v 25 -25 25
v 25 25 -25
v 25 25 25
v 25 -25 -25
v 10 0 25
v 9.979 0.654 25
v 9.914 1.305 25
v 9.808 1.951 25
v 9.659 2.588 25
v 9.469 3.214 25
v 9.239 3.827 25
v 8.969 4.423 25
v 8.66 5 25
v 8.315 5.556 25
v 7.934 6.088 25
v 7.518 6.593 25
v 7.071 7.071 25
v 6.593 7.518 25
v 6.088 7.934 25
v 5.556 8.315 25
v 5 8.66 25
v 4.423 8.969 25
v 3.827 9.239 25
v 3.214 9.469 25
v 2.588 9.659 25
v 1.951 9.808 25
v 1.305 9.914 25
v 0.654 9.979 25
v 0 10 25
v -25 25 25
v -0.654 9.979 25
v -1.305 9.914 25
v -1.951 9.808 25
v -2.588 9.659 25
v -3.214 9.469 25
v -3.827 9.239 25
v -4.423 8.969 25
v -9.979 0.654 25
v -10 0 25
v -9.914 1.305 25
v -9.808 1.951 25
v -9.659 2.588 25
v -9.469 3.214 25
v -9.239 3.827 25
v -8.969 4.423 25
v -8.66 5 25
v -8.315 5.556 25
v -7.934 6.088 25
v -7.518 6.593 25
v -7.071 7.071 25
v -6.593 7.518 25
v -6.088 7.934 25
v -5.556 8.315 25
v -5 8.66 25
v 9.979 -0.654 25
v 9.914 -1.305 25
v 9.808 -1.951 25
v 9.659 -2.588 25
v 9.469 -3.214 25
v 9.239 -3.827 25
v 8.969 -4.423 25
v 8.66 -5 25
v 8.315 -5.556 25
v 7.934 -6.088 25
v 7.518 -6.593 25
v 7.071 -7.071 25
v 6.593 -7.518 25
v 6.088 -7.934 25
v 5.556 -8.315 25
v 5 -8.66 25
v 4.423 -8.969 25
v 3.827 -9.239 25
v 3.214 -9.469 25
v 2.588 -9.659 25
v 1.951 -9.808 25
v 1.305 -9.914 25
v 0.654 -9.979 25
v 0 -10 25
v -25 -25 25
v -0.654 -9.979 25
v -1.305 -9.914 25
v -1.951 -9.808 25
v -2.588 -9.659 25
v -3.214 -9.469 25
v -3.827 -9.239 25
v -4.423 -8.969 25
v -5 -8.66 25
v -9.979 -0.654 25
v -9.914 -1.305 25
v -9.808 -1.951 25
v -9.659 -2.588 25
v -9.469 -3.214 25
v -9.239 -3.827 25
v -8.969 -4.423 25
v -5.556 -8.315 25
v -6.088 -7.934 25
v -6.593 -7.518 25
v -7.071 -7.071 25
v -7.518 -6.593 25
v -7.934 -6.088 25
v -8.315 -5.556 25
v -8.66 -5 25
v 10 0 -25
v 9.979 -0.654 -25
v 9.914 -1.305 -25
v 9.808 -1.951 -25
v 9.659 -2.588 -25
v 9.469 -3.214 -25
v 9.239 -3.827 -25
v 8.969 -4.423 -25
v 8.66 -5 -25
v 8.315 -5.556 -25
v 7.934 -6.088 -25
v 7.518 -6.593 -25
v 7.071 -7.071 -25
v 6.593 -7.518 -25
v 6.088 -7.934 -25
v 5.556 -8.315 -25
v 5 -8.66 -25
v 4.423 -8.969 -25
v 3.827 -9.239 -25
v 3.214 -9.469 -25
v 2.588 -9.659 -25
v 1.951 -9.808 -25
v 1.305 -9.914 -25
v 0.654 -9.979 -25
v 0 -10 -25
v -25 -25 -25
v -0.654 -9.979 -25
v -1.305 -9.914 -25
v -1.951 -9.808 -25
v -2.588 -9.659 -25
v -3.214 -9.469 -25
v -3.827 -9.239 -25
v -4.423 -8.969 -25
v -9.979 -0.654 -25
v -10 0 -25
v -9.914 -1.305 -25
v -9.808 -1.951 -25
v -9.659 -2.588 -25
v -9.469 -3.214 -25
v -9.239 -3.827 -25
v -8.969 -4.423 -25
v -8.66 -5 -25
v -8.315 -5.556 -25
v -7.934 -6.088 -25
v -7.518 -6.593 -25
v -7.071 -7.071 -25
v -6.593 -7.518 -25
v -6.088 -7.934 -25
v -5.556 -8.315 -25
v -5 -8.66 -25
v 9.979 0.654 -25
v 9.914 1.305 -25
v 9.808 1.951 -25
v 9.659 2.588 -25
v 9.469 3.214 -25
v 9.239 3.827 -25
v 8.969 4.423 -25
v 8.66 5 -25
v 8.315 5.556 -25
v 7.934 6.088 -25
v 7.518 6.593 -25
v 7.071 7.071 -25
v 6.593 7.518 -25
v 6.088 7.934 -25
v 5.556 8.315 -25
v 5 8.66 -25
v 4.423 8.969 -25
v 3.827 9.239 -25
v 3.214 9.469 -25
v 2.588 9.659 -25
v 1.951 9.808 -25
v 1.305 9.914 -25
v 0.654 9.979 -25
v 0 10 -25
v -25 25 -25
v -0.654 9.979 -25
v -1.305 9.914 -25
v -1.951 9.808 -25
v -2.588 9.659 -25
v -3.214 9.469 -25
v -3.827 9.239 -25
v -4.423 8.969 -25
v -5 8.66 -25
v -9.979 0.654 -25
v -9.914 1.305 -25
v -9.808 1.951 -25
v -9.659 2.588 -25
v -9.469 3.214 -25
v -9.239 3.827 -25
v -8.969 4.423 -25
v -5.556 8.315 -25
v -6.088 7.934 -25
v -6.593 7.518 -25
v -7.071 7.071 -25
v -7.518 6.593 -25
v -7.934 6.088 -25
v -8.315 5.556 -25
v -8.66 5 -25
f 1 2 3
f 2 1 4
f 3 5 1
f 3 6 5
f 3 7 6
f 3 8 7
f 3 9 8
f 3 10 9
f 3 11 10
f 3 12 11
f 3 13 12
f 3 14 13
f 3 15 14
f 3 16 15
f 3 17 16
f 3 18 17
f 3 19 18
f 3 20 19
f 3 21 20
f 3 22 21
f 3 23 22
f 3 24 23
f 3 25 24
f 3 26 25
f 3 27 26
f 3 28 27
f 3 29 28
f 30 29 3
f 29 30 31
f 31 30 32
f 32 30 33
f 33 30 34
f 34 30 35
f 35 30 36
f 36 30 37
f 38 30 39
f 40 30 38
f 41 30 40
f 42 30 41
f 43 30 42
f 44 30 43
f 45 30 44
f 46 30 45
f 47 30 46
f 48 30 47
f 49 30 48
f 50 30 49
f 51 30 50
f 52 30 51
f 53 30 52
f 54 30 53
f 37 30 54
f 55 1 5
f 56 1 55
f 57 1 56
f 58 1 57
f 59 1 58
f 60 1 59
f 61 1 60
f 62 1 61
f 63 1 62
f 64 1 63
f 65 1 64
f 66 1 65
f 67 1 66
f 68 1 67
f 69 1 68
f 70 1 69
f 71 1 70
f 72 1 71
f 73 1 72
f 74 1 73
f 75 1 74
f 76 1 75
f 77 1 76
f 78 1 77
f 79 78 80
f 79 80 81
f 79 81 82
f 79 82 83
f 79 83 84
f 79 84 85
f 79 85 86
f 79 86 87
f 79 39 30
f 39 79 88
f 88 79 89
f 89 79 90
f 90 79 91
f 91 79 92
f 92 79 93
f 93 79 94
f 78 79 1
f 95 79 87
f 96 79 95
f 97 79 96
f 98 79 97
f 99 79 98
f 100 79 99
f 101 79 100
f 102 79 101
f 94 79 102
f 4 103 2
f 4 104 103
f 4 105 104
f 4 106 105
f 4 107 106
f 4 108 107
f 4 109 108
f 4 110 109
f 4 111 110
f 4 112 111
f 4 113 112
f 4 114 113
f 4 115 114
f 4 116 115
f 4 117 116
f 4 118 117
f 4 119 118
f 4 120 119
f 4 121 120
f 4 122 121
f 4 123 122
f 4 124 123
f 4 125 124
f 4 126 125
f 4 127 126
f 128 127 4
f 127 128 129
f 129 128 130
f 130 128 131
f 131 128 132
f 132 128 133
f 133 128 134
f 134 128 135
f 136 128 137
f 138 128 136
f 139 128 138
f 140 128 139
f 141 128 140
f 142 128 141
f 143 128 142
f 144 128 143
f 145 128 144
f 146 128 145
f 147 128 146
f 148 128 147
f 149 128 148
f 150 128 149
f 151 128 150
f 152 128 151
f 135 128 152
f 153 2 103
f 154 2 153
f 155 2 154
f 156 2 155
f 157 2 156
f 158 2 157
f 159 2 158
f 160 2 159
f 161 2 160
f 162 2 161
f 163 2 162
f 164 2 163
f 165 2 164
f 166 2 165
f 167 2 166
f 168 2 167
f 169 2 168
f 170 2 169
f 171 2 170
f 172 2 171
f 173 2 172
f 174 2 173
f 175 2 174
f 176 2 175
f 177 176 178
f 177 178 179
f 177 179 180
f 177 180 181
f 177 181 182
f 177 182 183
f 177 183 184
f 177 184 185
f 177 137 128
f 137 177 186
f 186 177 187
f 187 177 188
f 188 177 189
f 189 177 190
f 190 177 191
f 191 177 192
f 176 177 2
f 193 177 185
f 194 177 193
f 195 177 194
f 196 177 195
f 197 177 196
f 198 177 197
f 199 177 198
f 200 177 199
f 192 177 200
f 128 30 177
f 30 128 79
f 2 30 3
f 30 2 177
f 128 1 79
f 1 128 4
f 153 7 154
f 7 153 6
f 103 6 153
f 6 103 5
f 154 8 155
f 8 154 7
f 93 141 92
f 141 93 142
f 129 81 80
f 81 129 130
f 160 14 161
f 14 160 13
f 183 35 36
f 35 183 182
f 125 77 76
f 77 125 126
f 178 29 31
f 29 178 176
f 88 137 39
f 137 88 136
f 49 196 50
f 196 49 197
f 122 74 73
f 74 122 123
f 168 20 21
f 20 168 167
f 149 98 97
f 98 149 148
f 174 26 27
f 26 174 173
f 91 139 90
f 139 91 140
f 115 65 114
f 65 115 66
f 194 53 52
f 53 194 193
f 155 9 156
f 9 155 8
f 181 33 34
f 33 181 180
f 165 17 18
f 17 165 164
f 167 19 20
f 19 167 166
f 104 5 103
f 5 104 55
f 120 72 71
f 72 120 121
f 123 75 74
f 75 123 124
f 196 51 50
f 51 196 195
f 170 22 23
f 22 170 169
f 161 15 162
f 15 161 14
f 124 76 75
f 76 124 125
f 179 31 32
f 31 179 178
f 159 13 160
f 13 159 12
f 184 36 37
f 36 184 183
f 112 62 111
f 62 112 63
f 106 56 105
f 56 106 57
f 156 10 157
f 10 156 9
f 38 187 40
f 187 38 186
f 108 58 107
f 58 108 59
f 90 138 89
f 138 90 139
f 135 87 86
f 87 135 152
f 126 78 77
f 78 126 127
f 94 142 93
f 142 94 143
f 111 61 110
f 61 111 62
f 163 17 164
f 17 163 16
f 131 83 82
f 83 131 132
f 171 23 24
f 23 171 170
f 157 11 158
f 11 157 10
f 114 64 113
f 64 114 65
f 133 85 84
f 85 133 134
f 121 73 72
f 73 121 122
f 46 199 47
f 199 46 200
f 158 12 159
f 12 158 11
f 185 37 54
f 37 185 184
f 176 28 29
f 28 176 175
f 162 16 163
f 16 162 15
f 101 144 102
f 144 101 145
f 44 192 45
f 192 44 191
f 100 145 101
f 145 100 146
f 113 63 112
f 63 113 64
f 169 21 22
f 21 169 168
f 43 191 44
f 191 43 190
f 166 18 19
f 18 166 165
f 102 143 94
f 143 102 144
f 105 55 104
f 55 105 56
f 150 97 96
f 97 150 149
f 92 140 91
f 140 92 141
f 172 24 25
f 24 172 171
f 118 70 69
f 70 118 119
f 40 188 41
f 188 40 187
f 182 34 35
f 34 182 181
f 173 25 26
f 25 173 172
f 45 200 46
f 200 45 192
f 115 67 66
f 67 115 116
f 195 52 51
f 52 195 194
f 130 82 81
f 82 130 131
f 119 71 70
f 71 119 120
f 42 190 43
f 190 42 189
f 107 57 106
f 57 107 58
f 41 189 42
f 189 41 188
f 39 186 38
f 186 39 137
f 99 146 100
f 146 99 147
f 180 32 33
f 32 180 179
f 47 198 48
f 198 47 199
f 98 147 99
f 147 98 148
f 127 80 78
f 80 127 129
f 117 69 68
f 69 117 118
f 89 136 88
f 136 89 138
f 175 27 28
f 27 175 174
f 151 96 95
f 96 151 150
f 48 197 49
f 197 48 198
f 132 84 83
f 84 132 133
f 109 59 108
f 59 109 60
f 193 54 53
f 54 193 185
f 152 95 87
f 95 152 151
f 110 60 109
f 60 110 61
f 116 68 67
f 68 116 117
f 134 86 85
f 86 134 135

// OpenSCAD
difference() {
    cube([50, 50, 50], center = true);
    cylinder(h = 52, d = 20, center = true, $fn = 96);
}
